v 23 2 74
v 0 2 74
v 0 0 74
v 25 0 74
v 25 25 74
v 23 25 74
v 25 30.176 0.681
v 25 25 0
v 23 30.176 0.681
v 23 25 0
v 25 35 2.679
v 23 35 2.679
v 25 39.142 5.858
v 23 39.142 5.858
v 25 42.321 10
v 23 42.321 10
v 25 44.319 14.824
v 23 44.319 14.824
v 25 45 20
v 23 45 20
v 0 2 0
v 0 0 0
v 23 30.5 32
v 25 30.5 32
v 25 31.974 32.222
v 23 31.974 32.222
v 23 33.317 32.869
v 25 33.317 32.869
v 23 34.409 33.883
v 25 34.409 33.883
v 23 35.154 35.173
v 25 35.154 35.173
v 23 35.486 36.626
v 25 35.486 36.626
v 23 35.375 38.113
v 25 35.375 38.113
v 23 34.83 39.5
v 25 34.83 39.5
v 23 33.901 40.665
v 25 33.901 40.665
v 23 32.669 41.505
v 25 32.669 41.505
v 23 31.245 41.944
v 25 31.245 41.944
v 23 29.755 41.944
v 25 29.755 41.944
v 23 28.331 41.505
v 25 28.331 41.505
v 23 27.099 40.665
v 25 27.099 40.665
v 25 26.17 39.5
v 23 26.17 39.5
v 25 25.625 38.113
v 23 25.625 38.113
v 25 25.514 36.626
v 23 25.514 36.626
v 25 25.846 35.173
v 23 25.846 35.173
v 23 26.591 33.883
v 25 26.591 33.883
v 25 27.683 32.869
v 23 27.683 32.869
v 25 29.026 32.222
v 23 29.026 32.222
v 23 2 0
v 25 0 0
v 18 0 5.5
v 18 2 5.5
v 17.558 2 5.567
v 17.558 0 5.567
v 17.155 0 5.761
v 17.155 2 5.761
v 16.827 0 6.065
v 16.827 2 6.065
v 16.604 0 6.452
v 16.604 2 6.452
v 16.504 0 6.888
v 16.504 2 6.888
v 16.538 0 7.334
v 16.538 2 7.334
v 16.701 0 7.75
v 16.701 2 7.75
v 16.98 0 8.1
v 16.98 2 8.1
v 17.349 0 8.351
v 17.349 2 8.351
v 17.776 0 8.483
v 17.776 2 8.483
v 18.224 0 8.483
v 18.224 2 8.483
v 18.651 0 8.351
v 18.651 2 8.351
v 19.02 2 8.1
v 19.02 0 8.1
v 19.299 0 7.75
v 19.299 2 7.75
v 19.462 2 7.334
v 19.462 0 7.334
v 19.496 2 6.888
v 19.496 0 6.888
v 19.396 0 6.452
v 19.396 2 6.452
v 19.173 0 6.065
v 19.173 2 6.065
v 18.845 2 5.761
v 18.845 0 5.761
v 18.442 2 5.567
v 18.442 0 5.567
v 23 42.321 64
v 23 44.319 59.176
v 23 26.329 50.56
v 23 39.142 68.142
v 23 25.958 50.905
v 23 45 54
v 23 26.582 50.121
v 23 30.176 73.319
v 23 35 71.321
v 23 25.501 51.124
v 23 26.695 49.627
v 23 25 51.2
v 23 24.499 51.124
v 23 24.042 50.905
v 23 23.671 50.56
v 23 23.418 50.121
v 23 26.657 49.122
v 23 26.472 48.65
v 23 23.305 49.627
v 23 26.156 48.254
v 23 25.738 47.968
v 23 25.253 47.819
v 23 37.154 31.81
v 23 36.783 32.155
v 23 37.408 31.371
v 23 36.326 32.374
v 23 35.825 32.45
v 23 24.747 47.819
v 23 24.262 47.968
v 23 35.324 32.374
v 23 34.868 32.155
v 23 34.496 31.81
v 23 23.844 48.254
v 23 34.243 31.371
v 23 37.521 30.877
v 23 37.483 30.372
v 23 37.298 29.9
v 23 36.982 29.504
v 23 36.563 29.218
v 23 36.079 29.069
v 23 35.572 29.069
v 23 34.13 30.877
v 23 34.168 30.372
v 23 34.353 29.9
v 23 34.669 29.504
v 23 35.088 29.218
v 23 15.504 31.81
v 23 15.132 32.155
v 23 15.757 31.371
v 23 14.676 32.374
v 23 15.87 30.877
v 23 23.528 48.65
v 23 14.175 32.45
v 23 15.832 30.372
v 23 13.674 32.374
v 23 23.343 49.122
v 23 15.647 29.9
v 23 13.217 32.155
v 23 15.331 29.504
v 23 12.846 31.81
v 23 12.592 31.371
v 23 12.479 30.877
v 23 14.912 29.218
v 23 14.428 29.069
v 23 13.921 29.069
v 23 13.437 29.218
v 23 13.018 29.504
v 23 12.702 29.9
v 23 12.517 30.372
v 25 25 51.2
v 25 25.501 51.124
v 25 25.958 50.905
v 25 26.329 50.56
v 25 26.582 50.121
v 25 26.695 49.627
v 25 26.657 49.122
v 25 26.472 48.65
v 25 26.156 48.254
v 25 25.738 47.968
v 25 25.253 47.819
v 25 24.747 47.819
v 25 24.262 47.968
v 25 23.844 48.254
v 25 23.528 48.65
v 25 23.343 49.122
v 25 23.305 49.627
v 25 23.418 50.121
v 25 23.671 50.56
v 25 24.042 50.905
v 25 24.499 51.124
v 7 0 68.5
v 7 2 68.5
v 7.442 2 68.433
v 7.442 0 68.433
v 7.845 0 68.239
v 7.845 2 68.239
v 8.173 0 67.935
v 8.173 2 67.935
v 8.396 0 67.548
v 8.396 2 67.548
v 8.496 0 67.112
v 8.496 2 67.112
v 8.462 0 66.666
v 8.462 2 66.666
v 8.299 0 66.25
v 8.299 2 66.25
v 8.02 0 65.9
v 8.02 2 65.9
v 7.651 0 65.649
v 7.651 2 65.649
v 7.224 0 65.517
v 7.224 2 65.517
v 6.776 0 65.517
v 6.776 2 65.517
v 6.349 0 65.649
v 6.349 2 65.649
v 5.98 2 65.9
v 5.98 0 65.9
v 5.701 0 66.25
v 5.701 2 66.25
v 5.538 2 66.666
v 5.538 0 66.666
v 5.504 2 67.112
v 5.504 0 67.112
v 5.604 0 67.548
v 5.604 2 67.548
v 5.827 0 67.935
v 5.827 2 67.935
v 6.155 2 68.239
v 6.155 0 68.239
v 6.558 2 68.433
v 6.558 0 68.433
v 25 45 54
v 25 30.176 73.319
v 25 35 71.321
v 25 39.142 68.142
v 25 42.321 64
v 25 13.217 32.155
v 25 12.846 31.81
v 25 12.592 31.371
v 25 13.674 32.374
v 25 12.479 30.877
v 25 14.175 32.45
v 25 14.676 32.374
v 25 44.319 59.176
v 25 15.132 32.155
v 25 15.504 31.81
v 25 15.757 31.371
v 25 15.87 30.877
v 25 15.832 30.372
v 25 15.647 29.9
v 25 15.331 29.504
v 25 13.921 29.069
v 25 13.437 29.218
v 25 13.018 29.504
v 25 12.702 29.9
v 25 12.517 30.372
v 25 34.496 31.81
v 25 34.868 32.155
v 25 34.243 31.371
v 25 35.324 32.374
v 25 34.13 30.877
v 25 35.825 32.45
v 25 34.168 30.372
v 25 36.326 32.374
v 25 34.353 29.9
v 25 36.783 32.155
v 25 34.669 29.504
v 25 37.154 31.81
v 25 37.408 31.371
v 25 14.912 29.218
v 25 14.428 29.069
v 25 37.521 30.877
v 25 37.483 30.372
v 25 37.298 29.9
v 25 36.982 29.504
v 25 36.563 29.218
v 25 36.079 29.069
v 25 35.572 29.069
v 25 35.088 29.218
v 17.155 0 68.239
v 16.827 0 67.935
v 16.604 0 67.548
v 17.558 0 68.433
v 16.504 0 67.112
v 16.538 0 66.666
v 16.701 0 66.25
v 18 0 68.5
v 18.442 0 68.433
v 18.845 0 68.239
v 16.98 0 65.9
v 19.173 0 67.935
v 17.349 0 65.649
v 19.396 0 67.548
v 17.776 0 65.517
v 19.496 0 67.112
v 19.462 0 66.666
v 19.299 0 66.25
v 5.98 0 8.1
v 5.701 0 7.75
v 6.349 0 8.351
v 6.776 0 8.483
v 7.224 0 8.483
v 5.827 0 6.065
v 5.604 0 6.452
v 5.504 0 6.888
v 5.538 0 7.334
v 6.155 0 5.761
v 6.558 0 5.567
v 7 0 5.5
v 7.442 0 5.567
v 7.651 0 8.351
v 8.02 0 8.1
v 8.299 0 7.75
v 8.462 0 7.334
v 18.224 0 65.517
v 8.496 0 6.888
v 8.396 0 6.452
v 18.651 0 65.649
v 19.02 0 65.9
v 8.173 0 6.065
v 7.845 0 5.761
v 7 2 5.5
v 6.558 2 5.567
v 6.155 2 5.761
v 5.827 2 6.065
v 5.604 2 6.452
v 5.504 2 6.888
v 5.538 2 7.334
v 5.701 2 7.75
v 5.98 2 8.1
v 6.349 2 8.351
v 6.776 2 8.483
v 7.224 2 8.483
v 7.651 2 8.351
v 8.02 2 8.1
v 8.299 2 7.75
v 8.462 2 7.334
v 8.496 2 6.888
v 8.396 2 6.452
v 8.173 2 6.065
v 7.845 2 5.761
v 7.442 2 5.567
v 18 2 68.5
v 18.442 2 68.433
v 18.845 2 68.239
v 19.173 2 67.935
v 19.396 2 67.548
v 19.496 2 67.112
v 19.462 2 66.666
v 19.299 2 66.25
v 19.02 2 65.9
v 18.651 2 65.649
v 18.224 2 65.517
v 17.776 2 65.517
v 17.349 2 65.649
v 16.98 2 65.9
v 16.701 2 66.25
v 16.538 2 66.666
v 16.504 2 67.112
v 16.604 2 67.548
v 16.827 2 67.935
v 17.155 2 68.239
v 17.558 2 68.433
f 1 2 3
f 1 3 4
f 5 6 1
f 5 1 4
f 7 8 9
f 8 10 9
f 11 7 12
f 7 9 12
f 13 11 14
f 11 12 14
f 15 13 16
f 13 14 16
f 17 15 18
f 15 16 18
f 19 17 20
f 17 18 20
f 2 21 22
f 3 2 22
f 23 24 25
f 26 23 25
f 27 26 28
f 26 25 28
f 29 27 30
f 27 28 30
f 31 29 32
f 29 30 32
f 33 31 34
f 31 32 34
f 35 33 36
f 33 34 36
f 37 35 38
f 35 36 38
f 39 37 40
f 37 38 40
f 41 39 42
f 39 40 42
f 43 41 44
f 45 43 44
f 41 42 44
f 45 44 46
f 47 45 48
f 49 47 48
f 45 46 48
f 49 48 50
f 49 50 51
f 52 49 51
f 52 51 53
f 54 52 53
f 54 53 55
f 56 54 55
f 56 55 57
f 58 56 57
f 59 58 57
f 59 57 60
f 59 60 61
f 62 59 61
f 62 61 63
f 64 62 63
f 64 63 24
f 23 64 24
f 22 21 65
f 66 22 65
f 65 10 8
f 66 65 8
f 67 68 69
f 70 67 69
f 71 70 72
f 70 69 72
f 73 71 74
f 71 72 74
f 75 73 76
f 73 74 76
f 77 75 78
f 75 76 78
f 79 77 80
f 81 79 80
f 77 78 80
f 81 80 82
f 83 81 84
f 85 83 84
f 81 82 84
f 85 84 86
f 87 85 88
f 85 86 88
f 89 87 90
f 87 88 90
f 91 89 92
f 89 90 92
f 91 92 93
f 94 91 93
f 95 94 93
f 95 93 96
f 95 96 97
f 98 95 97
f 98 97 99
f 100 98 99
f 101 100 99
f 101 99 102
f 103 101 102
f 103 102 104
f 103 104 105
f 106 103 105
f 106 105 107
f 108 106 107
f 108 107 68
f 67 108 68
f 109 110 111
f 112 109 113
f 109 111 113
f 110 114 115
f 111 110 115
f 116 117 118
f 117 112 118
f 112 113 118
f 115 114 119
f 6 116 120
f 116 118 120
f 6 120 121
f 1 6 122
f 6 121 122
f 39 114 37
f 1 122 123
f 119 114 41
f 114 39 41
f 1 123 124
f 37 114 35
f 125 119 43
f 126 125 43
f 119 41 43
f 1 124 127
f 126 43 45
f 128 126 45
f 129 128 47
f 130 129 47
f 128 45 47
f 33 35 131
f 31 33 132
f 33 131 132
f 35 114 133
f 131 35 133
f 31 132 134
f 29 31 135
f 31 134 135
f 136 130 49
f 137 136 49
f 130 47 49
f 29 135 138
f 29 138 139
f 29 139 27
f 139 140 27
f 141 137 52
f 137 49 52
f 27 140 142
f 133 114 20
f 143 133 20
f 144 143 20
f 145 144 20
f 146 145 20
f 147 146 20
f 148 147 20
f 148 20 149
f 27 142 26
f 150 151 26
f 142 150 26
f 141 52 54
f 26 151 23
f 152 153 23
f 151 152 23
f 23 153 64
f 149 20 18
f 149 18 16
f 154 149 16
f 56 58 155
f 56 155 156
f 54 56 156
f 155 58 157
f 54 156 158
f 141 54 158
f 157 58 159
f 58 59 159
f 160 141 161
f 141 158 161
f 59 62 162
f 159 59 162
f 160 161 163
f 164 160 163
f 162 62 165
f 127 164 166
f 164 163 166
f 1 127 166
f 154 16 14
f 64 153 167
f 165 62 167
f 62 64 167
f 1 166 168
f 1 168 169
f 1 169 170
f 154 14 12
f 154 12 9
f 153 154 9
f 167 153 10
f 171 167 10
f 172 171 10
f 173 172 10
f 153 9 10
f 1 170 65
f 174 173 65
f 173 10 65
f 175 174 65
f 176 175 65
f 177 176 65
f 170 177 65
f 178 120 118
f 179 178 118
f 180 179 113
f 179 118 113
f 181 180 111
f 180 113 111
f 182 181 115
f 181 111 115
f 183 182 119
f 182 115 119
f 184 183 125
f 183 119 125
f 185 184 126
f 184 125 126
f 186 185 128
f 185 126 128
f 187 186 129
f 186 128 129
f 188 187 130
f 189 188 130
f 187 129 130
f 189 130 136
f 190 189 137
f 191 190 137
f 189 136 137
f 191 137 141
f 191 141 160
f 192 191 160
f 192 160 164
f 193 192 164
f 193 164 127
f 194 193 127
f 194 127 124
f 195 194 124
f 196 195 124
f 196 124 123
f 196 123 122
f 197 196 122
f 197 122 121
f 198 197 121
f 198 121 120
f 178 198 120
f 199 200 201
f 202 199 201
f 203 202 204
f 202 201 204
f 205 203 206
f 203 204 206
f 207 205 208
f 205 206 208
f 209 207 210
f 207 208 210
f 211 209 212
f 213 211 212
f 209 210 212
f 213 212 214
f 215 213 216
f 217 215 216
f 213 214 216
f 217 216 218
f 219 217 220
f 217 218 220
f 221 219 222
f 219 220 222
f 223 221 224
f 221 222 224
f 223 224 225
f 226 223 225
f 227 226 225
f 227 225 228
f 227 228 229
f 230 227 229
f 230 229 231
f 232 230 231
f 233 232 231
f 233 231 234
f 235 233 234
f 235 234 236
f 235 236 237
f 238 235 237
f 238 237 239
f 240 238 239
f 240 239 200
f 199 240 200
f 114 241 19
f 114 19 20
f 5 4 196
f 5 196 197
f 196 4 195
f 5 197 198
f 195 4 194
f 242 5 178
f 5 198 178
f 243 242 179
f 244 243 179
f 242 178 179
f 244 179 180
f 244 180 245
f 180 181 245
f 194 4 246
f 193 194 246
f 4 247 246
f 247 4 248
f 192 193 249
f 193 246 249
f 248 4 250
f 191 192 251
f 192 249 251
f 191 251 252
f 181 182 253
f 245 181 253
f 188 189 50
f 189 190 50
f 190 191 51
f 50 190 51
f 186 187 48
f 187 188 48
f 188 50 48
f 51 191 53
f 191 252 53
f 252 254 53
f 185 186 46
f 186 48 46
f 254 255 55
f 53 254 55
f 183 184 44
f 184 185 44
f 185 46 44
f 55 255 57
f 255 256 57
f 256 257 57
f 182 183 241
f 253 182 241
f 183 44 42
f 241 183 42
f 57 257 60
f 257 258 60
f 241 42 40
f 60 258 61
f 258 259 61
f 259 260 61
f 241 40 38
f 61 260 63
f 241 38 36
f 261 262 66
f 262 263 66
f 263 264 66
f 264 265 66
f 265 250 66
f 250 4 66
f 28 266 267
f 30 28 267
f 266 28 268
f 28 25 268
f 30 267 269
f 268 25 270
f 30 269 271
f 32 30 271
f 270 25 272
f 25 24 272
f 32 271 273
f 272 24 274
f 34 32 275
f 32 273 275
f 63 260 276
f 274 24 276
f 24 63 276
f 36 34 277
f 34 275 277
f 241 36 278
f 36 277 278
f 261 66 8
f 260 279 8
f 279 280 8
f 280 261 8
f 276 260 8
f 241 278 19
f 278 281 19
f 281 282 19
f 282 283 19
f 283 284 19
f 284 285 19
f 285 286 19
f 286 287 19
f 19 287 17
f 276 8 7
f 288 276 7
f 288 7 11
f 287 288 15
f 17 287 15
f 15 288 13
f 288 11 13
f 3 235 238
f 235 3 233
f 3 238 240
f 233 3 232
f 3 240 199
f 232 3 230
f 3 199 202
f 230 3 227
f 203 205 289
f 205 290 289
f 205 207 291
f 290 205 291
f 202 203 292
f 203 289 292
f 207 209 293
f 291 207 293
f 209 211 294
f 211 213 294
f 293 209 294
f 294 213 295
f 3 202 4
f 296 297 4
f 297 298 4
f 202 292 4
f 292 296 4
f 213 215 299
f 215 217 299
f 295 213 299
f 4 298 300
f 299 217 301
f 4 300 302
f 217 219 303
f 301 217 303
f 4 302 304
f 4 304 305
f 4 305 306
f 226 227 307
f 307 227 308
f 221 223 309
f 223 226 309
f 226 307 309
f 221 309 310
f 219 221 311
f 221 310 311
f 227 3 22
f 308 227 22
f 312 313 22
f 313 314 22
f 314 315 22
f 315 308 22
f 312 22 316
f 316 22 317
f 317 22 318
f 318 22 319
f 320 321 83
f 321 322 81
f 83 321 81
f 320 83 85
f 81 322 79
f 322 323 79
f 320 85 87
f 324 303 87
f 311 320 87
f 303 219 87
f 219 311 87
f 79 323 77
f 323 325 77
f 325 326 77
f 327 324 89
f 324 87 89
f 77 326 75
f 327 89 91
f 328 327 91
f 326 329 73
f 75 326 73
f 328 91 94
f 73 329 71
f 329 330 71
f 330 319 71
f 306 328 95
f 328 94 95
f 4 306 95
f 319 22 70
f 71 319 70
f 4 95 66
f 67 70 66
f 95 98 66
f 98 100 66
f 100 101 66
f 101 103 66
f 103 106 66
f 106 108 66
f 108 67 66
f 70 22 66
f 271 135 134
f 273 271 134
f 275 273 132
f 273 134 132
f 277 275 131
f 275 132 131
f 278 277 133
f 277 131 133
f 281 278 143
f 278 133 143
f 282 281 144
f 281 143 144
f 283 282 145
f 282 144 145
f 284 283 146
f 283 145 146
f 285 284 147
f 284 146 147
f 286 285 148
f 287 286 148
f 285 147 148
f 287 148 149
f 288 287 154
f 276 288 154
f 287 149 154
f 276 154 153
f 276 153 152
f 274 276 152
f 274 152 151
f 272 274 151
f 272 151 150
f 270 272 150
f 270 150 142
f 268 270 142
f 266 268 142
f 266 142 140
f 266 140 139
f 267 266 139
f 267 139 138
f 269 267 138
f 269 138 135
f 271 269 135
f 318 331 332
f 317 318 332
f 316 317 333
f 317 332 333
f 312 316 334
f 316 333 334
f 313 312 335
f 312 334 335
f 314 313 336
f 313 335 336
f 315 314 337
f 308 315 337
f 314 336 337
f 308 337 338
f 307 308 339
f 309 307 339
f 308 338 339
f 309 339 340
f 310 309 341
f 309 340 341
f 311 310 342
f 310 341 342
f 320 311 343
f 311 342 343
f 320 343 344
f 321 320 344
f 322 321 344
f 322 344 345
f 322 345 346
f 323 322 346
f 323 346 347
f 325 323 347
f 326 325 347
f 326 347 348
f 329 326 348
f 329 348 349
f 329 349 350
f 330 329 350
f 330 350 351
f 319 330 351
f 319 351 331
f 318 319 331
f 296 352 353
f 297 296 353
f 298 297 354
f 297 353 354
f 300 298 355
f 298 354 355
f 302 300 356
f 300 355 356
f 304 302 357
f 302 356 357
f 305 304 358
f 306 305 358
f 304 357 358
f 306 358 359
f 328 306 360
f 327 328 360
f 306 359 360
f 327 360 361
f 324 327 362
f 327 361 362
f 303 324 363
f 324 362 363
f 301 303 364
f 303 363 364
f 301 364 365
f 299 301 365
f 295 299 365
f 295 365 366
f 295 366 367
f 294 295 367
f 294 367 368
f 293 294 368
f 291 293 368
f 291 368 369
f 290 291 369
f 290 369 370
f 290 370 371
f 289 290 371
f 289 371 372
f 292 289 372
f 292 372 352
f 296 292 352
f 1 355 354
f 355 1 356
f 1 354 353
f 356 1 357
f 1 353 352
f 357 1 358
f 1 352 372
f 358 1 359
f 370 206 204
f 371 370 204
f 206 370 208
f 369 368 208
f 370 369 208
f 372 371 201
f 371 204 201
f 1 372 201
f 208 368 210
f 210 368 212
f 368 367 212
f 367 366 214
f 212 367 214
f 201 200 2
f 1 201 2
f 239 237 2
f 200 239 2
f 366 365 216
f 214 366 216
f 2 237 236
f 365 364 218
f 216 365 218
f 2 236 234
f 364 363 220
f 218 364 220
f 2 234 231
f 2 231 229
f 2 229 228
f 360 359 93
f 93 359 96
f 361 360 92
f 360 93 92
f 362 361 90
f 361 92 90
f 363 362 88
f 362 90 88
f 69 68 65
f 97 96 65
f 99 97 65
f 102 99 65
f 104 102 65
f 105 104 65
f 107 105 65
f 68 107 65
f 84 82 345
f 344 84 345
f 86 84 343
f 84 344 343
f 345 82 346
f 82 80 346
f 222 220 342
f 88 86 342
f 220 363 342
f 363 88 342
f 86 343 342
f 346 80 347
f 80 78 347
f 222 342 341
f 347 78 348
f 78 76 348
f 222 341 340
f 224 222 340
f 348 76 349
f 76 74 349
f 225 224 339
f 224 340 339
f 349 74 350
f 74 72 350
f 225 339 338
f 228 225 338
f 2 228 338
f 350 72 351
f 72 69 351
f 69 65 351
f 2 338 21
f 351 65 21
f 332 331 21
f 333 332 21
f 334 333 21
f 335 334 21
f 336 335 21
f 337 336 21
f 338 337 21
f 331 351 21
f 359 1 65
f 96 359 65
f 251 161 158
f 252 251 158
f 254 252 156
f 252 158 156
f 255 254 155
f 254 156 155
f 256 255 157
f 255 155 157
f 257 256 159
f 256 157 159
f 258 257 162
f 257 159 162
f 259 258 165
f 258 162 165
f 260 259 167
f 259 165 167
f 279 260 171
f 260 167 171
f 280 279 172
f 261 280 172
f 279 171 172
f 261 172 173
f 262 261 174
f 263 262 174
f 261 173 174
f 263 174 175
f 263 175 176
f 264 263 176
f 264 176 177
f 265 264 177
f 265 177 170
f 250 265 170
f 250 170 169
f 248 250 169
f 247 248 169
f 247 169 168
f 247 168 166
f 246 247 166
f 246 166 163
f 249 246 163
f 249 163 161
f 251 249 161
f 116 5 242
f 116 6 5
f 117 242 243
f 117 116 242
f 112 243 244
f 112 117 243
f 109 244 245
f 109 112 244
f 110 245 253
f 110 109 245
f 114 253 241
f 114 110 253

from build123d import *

# Parameters (mm, degrees)
BOSS_EXTRUDE3_DEPTH  = 74
SKETCH5_R            = 5
CUT_EXTRUDE1_DEPTH   = 91.144328718
M3_CLEARANCE_HOLE2_D = 3.4
SKETCH11_R           = 1.5
CUT_EXTRUDE2_DEPTH   = 90.162772501
FILLET1_R            = 20


with BuildPart() as part:
    # Sketch4 → Boss-Extrude3 (new body)
    with BuildSketch(Plane.XY):
        Polygon((0, 0), (25, 0), (25, 45), (23, 45), (23, 2), (0, 2), align=None)
    extrude(amount=BOSS_EXTRUDE3_DEPTH)

    # Sketch5 → Cut-Extrude1 (cut, through all)
    with BuildSketch(Plane(origin=(25, 0, 0), x_dir=(0, 0, -1), z_dir=(1, 0, 0))):
        with Locations((-37, 30.5)):
            Circle(SKETCH5_R)
    extrude(amount=-CUT_EXTRUDE1_DEPTH, mode=Mode.SUBTRACT)

    # M3 Clearance Hole2 (through all)
    with Locations(Plane(origin=(25, 0, 0), x_dir=(0, 0, -1), z_dir=(1, 0, 0))):
        with Locations((-30.75, 14.174682453), (-30.75, 35.825317547), (-49.5, 25)):
            Hole(M3_CLEARANCE_HOLE2_D / 2)

    # Sketch11 → Cut-Extrude2 (cut, through all)
    with BuildSketch(Plane(origin=(0, 2, 0), x_dir=(1, 0, 0), z_dir=(0, 1, 0))):
        with Locations(Location((7, -67, 0), (0, 0, 270))):
            Circle(SKETCH11_R)
        with Locations(Location((18, -67, 0), (0, 0, 270))):
            Circle(SKETCH11_R)
        with Locations(Location((18, -7, 0), (0, 0, 90))):
            Circle(SKETCH11_R)
        with Locations(Location((7, -7, 0), (0, 0, 90))):
            Circle(SKETCH11_R)
    extrude(amount=-CUT_EXTRUDE2_DEPTH, mode=Mode.SUBTRACT)

    # Fillet1
    fillet1_edges = [part.edges().sort_by_distance(p)[0] for p in [
        (24, 45, 74),
        (24, 45, 0),
    ]]
    fillet(fillet1_edges, radius=FILLET1_R)


solid = part.part
